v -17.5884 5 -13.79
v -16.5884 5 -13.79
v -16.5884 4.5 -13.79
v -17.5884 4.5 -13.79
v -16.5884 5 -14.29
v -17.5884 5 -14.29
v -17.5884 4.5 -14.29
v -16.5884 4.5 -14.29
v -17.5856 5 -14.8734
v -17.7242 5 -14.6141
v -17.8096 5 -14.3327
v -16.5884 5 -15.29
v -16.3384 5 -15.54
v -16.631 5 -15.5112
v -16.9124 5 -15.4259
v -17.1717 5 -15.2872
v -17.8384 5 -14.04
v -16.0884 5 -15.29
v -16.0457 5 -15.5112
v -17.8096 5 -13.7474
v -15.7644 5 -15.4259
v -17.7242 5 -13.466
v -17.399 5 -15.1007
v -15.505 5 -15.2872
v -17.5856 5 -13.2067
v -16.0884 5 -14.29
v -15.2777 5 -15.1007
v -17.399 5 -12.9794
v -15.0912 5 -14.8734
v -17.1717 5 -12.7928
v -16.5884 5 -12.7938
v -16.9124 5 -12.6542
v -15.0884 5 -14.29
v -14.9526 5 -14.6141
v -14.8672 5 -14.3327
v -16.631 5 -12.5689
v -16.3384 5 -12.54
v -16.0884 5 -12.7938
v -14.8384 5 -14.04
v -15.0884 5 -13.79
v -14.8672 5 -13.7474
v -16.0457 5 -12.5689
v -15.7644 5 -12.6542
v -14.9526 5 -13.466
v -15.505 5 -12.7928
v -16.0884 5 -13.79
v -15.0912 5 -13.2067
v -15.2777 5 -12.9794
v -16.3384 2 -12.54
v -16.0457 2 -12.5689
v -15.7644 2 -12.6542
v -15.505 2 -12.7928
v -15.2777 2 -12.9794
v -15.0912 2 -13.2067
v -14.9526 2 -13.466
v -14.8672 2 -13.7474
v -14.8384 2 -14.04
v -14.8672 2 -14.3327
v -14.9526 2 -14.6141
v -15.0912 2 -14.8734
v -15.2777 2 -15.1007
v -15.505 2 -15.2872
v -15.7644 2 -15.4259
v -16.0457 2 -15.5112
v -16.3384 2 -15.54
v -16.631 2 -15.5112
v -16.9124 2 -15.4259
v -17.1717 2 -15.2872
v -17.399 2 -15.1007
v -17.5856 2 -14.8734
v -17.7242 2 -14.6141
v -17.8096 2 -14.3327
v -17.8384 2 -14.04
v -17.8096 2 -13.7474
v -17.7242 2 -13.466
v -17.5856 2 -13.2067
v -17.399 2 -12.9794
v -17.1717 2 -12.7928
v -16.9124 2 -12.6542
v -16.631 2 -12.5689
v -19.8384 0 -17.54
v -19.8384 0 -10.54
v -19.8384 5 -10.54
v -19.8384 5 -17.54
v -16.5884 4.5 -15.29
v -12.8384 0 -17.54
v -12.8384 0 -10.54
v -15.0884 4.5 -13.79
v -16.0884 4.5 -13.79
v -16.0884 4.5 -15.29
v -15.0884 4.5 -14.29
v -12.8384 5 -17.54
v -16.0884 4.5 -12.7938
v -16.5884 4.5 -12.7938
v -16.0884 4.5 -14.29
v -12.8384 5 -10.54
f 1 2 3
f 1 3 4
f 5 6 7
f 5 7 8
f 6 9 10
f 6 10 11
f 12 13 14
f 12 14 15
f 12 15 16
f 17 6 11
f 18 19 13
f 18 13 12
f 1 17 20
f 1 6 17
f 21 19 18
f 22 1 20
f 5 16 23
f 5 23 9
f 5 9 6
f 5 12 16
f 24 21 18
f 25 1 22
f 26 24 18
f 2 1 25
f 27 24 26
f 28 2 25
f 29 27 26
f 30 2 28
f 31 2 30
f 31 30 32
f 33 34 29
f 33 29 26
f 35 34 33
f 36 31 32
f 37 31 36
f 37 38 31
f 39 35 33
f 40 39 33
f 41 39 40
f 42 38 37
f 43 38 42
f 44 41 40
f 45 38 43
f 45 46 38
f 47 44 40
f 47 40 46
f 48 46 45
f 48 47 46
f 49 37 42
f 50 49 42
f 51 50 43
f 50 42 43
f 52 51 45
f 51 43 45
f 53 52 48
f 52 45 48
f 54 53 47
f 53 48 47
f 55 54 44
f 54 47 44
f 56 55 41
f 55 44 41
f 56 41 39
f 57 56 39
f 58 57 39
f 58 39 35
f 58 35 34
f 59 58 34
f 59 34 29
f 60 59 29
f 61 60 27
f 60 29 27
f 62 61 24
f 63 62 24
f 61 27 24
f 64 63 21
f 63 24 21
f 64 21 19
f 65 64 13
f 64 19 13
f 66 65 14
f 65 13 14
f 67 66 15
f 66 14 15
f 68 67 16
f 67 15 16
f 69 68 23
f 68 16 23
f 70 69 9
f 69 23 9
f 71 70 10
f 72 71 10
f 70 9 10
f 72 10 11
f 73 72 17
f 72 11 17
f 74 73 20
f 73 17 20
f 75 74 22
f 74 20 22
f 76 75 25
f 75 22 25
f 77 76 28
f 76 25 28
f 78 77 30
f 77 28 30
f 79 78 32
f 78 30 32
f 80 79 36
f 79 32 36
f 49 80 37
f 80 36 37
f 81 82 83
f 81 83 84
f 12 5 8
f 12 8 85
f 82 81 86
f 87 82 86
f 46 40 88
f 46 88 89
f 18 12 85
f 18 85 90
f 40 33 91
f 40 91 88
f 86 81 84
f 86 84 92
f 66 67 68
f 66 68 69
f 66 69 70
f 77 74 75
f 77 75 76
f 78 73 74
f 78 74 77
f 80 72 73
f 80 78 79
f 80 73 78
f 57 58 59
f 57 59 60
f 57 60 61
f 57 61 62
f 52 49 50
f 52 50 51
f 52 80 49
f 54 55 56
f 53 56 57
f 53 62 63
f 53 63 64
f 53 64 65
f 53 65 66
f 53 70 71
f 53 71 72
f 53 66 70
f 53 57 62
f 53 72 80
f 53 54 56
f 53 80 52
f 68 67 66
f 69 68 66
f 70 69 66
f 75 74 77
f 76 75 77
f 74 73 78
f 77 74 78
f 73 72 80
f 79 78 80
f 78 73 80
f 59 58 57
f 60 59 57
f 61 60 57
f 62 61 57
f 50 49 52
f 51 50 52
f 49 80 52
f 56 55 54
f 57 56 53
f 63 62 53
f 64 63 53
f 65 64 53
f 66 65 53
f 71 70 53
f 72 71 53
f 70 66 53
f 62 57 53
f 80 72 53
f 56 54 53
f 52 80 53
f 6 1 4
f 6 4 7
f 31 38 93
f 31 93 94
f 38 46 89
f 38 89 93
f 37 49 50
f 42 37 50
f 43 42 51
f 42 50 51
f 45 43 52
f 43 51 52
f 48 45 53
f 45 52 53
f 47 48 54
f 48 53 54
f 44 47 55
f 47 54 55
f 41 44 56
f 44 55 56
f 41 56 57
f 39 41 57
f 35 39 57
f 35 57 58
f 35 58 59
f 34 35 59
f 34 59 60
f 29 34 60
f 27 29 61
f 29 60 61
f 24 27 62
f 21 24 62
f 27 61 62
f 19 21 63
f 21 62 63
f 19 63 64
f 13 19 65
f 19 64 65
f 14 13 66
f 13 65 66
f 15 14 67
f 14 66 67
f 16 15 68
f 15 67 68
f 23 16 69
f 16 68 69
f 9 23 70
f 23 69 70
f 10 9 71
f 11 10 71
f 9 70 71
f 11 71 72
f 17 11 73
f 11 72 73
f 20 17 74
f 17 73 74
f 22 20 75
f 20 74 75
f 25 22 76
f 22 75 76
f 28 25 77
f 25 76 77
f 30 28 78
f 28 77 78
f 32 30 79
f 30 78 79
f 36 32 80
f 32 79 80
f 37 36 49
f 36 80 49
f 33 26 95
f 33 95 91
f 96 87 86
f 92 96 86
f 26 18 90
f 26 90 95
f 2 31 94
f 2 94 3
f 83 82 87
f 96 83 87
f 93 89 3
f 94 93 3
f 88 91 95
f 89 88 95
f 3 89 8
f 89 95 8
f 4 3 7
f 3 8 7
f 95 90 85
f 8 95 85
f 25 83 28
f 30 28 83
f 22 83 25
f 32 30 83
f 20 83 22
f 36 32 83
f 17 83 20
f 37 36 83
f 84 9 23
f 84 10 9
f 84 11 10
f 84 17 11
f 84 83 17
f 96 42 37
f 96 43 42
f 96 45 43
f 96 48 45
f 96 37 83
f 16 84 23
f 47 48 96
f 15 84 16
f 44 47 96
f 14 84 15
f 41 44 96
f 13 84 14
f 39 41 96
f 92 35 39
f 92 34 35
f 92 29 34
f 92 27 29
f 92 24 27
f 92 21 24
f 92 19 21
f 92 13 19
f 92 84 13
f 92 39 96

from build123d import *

# Parameters (mm, degrees)
SKETCH_1_W          = 7
SKETCH_1_H          = 7
EXTRUDE_1_DEPTH     = 5
SKETCH_2_R          = 1.5
CUT_EXTRUDE_1_DEPTH = 3
SKETCH_3_R          = 1.5
EXTRUDE_2_DEPTH     = 3
CUT_EXTRUDE_2_DEPTH = 0.5


with BuildPart() as part:
    # 草图1 → 凸台-拉伸1 (new body)
    with BuildSketch(Plane(origin=(0, 0, 0), x_dir=(1, 0, 0), z_dir=(0, 1, 0))):
        with Locations((-16.338382139, 14.040032989)):
            Rectangle(SKETCH_1_W, SKETCH_1_H)
    extrude(amount=EXTRUDE_1_DEPTH)

    # 草图2 → 切除-拉伸1 (cut)
    with BuildSketch(Plane(origin=(0, 5, 0), x_dir=(1, 0, 0), z_dir=(0, 1, 0))):
        with Locations(Location((-16.338382139, 14.040032989, 0), (0, 0, 270))):
            Circle(SKETCH_2_R)
    extrude(amount=-CUT_EXTRUDE_1_DEPTH, mode=Mode.SUBTRACT)


with BuildPart() as body_2:
    # 草图3 → 凸台-拉伸2 (new body)
    with BuildSketch(Plane(origin=(0, 2, 0), x_dir=(1, 0, 0), z_dir=(0, 1, 0))):
        with Locations(Location((-16.338382139, 14.040032989, 0), (0, 0, 270))):
            Circle(SKETCH_3_R)
    extrude(amount=EXTRUDE_2_DEPTH)

    # 草图4 → 切除-拉伸2 (cut)
    with BuildSketch(Plane(origin=(0, 5, 0), x_dir=(1, 0, 0), z_dir=(0, 1, 0))):
        Polygon((-17.588382139, 14.290032989), (-16.588382139, 14.290032989), (-16.588382139, 15.290032989), (-16.088382139, 15.290032989), (-16.088382139, 14.290032989), (-15.088382139, 14.290032989), (-15.088382139, 13.790032989), (-16.088382139, 13.790032989), (-16.088382139, 12.79384017), (-16.588382139, 12.79384017), (-16.588382139, 13.790032989), (-17.588382139, 13.790032989), align=None)
    extrude(amount=-CUT_EXTRUDE_2_DEPTH, mode=Mode.SUBTRACT)


solid = Compound([part.part, body_2.part])
